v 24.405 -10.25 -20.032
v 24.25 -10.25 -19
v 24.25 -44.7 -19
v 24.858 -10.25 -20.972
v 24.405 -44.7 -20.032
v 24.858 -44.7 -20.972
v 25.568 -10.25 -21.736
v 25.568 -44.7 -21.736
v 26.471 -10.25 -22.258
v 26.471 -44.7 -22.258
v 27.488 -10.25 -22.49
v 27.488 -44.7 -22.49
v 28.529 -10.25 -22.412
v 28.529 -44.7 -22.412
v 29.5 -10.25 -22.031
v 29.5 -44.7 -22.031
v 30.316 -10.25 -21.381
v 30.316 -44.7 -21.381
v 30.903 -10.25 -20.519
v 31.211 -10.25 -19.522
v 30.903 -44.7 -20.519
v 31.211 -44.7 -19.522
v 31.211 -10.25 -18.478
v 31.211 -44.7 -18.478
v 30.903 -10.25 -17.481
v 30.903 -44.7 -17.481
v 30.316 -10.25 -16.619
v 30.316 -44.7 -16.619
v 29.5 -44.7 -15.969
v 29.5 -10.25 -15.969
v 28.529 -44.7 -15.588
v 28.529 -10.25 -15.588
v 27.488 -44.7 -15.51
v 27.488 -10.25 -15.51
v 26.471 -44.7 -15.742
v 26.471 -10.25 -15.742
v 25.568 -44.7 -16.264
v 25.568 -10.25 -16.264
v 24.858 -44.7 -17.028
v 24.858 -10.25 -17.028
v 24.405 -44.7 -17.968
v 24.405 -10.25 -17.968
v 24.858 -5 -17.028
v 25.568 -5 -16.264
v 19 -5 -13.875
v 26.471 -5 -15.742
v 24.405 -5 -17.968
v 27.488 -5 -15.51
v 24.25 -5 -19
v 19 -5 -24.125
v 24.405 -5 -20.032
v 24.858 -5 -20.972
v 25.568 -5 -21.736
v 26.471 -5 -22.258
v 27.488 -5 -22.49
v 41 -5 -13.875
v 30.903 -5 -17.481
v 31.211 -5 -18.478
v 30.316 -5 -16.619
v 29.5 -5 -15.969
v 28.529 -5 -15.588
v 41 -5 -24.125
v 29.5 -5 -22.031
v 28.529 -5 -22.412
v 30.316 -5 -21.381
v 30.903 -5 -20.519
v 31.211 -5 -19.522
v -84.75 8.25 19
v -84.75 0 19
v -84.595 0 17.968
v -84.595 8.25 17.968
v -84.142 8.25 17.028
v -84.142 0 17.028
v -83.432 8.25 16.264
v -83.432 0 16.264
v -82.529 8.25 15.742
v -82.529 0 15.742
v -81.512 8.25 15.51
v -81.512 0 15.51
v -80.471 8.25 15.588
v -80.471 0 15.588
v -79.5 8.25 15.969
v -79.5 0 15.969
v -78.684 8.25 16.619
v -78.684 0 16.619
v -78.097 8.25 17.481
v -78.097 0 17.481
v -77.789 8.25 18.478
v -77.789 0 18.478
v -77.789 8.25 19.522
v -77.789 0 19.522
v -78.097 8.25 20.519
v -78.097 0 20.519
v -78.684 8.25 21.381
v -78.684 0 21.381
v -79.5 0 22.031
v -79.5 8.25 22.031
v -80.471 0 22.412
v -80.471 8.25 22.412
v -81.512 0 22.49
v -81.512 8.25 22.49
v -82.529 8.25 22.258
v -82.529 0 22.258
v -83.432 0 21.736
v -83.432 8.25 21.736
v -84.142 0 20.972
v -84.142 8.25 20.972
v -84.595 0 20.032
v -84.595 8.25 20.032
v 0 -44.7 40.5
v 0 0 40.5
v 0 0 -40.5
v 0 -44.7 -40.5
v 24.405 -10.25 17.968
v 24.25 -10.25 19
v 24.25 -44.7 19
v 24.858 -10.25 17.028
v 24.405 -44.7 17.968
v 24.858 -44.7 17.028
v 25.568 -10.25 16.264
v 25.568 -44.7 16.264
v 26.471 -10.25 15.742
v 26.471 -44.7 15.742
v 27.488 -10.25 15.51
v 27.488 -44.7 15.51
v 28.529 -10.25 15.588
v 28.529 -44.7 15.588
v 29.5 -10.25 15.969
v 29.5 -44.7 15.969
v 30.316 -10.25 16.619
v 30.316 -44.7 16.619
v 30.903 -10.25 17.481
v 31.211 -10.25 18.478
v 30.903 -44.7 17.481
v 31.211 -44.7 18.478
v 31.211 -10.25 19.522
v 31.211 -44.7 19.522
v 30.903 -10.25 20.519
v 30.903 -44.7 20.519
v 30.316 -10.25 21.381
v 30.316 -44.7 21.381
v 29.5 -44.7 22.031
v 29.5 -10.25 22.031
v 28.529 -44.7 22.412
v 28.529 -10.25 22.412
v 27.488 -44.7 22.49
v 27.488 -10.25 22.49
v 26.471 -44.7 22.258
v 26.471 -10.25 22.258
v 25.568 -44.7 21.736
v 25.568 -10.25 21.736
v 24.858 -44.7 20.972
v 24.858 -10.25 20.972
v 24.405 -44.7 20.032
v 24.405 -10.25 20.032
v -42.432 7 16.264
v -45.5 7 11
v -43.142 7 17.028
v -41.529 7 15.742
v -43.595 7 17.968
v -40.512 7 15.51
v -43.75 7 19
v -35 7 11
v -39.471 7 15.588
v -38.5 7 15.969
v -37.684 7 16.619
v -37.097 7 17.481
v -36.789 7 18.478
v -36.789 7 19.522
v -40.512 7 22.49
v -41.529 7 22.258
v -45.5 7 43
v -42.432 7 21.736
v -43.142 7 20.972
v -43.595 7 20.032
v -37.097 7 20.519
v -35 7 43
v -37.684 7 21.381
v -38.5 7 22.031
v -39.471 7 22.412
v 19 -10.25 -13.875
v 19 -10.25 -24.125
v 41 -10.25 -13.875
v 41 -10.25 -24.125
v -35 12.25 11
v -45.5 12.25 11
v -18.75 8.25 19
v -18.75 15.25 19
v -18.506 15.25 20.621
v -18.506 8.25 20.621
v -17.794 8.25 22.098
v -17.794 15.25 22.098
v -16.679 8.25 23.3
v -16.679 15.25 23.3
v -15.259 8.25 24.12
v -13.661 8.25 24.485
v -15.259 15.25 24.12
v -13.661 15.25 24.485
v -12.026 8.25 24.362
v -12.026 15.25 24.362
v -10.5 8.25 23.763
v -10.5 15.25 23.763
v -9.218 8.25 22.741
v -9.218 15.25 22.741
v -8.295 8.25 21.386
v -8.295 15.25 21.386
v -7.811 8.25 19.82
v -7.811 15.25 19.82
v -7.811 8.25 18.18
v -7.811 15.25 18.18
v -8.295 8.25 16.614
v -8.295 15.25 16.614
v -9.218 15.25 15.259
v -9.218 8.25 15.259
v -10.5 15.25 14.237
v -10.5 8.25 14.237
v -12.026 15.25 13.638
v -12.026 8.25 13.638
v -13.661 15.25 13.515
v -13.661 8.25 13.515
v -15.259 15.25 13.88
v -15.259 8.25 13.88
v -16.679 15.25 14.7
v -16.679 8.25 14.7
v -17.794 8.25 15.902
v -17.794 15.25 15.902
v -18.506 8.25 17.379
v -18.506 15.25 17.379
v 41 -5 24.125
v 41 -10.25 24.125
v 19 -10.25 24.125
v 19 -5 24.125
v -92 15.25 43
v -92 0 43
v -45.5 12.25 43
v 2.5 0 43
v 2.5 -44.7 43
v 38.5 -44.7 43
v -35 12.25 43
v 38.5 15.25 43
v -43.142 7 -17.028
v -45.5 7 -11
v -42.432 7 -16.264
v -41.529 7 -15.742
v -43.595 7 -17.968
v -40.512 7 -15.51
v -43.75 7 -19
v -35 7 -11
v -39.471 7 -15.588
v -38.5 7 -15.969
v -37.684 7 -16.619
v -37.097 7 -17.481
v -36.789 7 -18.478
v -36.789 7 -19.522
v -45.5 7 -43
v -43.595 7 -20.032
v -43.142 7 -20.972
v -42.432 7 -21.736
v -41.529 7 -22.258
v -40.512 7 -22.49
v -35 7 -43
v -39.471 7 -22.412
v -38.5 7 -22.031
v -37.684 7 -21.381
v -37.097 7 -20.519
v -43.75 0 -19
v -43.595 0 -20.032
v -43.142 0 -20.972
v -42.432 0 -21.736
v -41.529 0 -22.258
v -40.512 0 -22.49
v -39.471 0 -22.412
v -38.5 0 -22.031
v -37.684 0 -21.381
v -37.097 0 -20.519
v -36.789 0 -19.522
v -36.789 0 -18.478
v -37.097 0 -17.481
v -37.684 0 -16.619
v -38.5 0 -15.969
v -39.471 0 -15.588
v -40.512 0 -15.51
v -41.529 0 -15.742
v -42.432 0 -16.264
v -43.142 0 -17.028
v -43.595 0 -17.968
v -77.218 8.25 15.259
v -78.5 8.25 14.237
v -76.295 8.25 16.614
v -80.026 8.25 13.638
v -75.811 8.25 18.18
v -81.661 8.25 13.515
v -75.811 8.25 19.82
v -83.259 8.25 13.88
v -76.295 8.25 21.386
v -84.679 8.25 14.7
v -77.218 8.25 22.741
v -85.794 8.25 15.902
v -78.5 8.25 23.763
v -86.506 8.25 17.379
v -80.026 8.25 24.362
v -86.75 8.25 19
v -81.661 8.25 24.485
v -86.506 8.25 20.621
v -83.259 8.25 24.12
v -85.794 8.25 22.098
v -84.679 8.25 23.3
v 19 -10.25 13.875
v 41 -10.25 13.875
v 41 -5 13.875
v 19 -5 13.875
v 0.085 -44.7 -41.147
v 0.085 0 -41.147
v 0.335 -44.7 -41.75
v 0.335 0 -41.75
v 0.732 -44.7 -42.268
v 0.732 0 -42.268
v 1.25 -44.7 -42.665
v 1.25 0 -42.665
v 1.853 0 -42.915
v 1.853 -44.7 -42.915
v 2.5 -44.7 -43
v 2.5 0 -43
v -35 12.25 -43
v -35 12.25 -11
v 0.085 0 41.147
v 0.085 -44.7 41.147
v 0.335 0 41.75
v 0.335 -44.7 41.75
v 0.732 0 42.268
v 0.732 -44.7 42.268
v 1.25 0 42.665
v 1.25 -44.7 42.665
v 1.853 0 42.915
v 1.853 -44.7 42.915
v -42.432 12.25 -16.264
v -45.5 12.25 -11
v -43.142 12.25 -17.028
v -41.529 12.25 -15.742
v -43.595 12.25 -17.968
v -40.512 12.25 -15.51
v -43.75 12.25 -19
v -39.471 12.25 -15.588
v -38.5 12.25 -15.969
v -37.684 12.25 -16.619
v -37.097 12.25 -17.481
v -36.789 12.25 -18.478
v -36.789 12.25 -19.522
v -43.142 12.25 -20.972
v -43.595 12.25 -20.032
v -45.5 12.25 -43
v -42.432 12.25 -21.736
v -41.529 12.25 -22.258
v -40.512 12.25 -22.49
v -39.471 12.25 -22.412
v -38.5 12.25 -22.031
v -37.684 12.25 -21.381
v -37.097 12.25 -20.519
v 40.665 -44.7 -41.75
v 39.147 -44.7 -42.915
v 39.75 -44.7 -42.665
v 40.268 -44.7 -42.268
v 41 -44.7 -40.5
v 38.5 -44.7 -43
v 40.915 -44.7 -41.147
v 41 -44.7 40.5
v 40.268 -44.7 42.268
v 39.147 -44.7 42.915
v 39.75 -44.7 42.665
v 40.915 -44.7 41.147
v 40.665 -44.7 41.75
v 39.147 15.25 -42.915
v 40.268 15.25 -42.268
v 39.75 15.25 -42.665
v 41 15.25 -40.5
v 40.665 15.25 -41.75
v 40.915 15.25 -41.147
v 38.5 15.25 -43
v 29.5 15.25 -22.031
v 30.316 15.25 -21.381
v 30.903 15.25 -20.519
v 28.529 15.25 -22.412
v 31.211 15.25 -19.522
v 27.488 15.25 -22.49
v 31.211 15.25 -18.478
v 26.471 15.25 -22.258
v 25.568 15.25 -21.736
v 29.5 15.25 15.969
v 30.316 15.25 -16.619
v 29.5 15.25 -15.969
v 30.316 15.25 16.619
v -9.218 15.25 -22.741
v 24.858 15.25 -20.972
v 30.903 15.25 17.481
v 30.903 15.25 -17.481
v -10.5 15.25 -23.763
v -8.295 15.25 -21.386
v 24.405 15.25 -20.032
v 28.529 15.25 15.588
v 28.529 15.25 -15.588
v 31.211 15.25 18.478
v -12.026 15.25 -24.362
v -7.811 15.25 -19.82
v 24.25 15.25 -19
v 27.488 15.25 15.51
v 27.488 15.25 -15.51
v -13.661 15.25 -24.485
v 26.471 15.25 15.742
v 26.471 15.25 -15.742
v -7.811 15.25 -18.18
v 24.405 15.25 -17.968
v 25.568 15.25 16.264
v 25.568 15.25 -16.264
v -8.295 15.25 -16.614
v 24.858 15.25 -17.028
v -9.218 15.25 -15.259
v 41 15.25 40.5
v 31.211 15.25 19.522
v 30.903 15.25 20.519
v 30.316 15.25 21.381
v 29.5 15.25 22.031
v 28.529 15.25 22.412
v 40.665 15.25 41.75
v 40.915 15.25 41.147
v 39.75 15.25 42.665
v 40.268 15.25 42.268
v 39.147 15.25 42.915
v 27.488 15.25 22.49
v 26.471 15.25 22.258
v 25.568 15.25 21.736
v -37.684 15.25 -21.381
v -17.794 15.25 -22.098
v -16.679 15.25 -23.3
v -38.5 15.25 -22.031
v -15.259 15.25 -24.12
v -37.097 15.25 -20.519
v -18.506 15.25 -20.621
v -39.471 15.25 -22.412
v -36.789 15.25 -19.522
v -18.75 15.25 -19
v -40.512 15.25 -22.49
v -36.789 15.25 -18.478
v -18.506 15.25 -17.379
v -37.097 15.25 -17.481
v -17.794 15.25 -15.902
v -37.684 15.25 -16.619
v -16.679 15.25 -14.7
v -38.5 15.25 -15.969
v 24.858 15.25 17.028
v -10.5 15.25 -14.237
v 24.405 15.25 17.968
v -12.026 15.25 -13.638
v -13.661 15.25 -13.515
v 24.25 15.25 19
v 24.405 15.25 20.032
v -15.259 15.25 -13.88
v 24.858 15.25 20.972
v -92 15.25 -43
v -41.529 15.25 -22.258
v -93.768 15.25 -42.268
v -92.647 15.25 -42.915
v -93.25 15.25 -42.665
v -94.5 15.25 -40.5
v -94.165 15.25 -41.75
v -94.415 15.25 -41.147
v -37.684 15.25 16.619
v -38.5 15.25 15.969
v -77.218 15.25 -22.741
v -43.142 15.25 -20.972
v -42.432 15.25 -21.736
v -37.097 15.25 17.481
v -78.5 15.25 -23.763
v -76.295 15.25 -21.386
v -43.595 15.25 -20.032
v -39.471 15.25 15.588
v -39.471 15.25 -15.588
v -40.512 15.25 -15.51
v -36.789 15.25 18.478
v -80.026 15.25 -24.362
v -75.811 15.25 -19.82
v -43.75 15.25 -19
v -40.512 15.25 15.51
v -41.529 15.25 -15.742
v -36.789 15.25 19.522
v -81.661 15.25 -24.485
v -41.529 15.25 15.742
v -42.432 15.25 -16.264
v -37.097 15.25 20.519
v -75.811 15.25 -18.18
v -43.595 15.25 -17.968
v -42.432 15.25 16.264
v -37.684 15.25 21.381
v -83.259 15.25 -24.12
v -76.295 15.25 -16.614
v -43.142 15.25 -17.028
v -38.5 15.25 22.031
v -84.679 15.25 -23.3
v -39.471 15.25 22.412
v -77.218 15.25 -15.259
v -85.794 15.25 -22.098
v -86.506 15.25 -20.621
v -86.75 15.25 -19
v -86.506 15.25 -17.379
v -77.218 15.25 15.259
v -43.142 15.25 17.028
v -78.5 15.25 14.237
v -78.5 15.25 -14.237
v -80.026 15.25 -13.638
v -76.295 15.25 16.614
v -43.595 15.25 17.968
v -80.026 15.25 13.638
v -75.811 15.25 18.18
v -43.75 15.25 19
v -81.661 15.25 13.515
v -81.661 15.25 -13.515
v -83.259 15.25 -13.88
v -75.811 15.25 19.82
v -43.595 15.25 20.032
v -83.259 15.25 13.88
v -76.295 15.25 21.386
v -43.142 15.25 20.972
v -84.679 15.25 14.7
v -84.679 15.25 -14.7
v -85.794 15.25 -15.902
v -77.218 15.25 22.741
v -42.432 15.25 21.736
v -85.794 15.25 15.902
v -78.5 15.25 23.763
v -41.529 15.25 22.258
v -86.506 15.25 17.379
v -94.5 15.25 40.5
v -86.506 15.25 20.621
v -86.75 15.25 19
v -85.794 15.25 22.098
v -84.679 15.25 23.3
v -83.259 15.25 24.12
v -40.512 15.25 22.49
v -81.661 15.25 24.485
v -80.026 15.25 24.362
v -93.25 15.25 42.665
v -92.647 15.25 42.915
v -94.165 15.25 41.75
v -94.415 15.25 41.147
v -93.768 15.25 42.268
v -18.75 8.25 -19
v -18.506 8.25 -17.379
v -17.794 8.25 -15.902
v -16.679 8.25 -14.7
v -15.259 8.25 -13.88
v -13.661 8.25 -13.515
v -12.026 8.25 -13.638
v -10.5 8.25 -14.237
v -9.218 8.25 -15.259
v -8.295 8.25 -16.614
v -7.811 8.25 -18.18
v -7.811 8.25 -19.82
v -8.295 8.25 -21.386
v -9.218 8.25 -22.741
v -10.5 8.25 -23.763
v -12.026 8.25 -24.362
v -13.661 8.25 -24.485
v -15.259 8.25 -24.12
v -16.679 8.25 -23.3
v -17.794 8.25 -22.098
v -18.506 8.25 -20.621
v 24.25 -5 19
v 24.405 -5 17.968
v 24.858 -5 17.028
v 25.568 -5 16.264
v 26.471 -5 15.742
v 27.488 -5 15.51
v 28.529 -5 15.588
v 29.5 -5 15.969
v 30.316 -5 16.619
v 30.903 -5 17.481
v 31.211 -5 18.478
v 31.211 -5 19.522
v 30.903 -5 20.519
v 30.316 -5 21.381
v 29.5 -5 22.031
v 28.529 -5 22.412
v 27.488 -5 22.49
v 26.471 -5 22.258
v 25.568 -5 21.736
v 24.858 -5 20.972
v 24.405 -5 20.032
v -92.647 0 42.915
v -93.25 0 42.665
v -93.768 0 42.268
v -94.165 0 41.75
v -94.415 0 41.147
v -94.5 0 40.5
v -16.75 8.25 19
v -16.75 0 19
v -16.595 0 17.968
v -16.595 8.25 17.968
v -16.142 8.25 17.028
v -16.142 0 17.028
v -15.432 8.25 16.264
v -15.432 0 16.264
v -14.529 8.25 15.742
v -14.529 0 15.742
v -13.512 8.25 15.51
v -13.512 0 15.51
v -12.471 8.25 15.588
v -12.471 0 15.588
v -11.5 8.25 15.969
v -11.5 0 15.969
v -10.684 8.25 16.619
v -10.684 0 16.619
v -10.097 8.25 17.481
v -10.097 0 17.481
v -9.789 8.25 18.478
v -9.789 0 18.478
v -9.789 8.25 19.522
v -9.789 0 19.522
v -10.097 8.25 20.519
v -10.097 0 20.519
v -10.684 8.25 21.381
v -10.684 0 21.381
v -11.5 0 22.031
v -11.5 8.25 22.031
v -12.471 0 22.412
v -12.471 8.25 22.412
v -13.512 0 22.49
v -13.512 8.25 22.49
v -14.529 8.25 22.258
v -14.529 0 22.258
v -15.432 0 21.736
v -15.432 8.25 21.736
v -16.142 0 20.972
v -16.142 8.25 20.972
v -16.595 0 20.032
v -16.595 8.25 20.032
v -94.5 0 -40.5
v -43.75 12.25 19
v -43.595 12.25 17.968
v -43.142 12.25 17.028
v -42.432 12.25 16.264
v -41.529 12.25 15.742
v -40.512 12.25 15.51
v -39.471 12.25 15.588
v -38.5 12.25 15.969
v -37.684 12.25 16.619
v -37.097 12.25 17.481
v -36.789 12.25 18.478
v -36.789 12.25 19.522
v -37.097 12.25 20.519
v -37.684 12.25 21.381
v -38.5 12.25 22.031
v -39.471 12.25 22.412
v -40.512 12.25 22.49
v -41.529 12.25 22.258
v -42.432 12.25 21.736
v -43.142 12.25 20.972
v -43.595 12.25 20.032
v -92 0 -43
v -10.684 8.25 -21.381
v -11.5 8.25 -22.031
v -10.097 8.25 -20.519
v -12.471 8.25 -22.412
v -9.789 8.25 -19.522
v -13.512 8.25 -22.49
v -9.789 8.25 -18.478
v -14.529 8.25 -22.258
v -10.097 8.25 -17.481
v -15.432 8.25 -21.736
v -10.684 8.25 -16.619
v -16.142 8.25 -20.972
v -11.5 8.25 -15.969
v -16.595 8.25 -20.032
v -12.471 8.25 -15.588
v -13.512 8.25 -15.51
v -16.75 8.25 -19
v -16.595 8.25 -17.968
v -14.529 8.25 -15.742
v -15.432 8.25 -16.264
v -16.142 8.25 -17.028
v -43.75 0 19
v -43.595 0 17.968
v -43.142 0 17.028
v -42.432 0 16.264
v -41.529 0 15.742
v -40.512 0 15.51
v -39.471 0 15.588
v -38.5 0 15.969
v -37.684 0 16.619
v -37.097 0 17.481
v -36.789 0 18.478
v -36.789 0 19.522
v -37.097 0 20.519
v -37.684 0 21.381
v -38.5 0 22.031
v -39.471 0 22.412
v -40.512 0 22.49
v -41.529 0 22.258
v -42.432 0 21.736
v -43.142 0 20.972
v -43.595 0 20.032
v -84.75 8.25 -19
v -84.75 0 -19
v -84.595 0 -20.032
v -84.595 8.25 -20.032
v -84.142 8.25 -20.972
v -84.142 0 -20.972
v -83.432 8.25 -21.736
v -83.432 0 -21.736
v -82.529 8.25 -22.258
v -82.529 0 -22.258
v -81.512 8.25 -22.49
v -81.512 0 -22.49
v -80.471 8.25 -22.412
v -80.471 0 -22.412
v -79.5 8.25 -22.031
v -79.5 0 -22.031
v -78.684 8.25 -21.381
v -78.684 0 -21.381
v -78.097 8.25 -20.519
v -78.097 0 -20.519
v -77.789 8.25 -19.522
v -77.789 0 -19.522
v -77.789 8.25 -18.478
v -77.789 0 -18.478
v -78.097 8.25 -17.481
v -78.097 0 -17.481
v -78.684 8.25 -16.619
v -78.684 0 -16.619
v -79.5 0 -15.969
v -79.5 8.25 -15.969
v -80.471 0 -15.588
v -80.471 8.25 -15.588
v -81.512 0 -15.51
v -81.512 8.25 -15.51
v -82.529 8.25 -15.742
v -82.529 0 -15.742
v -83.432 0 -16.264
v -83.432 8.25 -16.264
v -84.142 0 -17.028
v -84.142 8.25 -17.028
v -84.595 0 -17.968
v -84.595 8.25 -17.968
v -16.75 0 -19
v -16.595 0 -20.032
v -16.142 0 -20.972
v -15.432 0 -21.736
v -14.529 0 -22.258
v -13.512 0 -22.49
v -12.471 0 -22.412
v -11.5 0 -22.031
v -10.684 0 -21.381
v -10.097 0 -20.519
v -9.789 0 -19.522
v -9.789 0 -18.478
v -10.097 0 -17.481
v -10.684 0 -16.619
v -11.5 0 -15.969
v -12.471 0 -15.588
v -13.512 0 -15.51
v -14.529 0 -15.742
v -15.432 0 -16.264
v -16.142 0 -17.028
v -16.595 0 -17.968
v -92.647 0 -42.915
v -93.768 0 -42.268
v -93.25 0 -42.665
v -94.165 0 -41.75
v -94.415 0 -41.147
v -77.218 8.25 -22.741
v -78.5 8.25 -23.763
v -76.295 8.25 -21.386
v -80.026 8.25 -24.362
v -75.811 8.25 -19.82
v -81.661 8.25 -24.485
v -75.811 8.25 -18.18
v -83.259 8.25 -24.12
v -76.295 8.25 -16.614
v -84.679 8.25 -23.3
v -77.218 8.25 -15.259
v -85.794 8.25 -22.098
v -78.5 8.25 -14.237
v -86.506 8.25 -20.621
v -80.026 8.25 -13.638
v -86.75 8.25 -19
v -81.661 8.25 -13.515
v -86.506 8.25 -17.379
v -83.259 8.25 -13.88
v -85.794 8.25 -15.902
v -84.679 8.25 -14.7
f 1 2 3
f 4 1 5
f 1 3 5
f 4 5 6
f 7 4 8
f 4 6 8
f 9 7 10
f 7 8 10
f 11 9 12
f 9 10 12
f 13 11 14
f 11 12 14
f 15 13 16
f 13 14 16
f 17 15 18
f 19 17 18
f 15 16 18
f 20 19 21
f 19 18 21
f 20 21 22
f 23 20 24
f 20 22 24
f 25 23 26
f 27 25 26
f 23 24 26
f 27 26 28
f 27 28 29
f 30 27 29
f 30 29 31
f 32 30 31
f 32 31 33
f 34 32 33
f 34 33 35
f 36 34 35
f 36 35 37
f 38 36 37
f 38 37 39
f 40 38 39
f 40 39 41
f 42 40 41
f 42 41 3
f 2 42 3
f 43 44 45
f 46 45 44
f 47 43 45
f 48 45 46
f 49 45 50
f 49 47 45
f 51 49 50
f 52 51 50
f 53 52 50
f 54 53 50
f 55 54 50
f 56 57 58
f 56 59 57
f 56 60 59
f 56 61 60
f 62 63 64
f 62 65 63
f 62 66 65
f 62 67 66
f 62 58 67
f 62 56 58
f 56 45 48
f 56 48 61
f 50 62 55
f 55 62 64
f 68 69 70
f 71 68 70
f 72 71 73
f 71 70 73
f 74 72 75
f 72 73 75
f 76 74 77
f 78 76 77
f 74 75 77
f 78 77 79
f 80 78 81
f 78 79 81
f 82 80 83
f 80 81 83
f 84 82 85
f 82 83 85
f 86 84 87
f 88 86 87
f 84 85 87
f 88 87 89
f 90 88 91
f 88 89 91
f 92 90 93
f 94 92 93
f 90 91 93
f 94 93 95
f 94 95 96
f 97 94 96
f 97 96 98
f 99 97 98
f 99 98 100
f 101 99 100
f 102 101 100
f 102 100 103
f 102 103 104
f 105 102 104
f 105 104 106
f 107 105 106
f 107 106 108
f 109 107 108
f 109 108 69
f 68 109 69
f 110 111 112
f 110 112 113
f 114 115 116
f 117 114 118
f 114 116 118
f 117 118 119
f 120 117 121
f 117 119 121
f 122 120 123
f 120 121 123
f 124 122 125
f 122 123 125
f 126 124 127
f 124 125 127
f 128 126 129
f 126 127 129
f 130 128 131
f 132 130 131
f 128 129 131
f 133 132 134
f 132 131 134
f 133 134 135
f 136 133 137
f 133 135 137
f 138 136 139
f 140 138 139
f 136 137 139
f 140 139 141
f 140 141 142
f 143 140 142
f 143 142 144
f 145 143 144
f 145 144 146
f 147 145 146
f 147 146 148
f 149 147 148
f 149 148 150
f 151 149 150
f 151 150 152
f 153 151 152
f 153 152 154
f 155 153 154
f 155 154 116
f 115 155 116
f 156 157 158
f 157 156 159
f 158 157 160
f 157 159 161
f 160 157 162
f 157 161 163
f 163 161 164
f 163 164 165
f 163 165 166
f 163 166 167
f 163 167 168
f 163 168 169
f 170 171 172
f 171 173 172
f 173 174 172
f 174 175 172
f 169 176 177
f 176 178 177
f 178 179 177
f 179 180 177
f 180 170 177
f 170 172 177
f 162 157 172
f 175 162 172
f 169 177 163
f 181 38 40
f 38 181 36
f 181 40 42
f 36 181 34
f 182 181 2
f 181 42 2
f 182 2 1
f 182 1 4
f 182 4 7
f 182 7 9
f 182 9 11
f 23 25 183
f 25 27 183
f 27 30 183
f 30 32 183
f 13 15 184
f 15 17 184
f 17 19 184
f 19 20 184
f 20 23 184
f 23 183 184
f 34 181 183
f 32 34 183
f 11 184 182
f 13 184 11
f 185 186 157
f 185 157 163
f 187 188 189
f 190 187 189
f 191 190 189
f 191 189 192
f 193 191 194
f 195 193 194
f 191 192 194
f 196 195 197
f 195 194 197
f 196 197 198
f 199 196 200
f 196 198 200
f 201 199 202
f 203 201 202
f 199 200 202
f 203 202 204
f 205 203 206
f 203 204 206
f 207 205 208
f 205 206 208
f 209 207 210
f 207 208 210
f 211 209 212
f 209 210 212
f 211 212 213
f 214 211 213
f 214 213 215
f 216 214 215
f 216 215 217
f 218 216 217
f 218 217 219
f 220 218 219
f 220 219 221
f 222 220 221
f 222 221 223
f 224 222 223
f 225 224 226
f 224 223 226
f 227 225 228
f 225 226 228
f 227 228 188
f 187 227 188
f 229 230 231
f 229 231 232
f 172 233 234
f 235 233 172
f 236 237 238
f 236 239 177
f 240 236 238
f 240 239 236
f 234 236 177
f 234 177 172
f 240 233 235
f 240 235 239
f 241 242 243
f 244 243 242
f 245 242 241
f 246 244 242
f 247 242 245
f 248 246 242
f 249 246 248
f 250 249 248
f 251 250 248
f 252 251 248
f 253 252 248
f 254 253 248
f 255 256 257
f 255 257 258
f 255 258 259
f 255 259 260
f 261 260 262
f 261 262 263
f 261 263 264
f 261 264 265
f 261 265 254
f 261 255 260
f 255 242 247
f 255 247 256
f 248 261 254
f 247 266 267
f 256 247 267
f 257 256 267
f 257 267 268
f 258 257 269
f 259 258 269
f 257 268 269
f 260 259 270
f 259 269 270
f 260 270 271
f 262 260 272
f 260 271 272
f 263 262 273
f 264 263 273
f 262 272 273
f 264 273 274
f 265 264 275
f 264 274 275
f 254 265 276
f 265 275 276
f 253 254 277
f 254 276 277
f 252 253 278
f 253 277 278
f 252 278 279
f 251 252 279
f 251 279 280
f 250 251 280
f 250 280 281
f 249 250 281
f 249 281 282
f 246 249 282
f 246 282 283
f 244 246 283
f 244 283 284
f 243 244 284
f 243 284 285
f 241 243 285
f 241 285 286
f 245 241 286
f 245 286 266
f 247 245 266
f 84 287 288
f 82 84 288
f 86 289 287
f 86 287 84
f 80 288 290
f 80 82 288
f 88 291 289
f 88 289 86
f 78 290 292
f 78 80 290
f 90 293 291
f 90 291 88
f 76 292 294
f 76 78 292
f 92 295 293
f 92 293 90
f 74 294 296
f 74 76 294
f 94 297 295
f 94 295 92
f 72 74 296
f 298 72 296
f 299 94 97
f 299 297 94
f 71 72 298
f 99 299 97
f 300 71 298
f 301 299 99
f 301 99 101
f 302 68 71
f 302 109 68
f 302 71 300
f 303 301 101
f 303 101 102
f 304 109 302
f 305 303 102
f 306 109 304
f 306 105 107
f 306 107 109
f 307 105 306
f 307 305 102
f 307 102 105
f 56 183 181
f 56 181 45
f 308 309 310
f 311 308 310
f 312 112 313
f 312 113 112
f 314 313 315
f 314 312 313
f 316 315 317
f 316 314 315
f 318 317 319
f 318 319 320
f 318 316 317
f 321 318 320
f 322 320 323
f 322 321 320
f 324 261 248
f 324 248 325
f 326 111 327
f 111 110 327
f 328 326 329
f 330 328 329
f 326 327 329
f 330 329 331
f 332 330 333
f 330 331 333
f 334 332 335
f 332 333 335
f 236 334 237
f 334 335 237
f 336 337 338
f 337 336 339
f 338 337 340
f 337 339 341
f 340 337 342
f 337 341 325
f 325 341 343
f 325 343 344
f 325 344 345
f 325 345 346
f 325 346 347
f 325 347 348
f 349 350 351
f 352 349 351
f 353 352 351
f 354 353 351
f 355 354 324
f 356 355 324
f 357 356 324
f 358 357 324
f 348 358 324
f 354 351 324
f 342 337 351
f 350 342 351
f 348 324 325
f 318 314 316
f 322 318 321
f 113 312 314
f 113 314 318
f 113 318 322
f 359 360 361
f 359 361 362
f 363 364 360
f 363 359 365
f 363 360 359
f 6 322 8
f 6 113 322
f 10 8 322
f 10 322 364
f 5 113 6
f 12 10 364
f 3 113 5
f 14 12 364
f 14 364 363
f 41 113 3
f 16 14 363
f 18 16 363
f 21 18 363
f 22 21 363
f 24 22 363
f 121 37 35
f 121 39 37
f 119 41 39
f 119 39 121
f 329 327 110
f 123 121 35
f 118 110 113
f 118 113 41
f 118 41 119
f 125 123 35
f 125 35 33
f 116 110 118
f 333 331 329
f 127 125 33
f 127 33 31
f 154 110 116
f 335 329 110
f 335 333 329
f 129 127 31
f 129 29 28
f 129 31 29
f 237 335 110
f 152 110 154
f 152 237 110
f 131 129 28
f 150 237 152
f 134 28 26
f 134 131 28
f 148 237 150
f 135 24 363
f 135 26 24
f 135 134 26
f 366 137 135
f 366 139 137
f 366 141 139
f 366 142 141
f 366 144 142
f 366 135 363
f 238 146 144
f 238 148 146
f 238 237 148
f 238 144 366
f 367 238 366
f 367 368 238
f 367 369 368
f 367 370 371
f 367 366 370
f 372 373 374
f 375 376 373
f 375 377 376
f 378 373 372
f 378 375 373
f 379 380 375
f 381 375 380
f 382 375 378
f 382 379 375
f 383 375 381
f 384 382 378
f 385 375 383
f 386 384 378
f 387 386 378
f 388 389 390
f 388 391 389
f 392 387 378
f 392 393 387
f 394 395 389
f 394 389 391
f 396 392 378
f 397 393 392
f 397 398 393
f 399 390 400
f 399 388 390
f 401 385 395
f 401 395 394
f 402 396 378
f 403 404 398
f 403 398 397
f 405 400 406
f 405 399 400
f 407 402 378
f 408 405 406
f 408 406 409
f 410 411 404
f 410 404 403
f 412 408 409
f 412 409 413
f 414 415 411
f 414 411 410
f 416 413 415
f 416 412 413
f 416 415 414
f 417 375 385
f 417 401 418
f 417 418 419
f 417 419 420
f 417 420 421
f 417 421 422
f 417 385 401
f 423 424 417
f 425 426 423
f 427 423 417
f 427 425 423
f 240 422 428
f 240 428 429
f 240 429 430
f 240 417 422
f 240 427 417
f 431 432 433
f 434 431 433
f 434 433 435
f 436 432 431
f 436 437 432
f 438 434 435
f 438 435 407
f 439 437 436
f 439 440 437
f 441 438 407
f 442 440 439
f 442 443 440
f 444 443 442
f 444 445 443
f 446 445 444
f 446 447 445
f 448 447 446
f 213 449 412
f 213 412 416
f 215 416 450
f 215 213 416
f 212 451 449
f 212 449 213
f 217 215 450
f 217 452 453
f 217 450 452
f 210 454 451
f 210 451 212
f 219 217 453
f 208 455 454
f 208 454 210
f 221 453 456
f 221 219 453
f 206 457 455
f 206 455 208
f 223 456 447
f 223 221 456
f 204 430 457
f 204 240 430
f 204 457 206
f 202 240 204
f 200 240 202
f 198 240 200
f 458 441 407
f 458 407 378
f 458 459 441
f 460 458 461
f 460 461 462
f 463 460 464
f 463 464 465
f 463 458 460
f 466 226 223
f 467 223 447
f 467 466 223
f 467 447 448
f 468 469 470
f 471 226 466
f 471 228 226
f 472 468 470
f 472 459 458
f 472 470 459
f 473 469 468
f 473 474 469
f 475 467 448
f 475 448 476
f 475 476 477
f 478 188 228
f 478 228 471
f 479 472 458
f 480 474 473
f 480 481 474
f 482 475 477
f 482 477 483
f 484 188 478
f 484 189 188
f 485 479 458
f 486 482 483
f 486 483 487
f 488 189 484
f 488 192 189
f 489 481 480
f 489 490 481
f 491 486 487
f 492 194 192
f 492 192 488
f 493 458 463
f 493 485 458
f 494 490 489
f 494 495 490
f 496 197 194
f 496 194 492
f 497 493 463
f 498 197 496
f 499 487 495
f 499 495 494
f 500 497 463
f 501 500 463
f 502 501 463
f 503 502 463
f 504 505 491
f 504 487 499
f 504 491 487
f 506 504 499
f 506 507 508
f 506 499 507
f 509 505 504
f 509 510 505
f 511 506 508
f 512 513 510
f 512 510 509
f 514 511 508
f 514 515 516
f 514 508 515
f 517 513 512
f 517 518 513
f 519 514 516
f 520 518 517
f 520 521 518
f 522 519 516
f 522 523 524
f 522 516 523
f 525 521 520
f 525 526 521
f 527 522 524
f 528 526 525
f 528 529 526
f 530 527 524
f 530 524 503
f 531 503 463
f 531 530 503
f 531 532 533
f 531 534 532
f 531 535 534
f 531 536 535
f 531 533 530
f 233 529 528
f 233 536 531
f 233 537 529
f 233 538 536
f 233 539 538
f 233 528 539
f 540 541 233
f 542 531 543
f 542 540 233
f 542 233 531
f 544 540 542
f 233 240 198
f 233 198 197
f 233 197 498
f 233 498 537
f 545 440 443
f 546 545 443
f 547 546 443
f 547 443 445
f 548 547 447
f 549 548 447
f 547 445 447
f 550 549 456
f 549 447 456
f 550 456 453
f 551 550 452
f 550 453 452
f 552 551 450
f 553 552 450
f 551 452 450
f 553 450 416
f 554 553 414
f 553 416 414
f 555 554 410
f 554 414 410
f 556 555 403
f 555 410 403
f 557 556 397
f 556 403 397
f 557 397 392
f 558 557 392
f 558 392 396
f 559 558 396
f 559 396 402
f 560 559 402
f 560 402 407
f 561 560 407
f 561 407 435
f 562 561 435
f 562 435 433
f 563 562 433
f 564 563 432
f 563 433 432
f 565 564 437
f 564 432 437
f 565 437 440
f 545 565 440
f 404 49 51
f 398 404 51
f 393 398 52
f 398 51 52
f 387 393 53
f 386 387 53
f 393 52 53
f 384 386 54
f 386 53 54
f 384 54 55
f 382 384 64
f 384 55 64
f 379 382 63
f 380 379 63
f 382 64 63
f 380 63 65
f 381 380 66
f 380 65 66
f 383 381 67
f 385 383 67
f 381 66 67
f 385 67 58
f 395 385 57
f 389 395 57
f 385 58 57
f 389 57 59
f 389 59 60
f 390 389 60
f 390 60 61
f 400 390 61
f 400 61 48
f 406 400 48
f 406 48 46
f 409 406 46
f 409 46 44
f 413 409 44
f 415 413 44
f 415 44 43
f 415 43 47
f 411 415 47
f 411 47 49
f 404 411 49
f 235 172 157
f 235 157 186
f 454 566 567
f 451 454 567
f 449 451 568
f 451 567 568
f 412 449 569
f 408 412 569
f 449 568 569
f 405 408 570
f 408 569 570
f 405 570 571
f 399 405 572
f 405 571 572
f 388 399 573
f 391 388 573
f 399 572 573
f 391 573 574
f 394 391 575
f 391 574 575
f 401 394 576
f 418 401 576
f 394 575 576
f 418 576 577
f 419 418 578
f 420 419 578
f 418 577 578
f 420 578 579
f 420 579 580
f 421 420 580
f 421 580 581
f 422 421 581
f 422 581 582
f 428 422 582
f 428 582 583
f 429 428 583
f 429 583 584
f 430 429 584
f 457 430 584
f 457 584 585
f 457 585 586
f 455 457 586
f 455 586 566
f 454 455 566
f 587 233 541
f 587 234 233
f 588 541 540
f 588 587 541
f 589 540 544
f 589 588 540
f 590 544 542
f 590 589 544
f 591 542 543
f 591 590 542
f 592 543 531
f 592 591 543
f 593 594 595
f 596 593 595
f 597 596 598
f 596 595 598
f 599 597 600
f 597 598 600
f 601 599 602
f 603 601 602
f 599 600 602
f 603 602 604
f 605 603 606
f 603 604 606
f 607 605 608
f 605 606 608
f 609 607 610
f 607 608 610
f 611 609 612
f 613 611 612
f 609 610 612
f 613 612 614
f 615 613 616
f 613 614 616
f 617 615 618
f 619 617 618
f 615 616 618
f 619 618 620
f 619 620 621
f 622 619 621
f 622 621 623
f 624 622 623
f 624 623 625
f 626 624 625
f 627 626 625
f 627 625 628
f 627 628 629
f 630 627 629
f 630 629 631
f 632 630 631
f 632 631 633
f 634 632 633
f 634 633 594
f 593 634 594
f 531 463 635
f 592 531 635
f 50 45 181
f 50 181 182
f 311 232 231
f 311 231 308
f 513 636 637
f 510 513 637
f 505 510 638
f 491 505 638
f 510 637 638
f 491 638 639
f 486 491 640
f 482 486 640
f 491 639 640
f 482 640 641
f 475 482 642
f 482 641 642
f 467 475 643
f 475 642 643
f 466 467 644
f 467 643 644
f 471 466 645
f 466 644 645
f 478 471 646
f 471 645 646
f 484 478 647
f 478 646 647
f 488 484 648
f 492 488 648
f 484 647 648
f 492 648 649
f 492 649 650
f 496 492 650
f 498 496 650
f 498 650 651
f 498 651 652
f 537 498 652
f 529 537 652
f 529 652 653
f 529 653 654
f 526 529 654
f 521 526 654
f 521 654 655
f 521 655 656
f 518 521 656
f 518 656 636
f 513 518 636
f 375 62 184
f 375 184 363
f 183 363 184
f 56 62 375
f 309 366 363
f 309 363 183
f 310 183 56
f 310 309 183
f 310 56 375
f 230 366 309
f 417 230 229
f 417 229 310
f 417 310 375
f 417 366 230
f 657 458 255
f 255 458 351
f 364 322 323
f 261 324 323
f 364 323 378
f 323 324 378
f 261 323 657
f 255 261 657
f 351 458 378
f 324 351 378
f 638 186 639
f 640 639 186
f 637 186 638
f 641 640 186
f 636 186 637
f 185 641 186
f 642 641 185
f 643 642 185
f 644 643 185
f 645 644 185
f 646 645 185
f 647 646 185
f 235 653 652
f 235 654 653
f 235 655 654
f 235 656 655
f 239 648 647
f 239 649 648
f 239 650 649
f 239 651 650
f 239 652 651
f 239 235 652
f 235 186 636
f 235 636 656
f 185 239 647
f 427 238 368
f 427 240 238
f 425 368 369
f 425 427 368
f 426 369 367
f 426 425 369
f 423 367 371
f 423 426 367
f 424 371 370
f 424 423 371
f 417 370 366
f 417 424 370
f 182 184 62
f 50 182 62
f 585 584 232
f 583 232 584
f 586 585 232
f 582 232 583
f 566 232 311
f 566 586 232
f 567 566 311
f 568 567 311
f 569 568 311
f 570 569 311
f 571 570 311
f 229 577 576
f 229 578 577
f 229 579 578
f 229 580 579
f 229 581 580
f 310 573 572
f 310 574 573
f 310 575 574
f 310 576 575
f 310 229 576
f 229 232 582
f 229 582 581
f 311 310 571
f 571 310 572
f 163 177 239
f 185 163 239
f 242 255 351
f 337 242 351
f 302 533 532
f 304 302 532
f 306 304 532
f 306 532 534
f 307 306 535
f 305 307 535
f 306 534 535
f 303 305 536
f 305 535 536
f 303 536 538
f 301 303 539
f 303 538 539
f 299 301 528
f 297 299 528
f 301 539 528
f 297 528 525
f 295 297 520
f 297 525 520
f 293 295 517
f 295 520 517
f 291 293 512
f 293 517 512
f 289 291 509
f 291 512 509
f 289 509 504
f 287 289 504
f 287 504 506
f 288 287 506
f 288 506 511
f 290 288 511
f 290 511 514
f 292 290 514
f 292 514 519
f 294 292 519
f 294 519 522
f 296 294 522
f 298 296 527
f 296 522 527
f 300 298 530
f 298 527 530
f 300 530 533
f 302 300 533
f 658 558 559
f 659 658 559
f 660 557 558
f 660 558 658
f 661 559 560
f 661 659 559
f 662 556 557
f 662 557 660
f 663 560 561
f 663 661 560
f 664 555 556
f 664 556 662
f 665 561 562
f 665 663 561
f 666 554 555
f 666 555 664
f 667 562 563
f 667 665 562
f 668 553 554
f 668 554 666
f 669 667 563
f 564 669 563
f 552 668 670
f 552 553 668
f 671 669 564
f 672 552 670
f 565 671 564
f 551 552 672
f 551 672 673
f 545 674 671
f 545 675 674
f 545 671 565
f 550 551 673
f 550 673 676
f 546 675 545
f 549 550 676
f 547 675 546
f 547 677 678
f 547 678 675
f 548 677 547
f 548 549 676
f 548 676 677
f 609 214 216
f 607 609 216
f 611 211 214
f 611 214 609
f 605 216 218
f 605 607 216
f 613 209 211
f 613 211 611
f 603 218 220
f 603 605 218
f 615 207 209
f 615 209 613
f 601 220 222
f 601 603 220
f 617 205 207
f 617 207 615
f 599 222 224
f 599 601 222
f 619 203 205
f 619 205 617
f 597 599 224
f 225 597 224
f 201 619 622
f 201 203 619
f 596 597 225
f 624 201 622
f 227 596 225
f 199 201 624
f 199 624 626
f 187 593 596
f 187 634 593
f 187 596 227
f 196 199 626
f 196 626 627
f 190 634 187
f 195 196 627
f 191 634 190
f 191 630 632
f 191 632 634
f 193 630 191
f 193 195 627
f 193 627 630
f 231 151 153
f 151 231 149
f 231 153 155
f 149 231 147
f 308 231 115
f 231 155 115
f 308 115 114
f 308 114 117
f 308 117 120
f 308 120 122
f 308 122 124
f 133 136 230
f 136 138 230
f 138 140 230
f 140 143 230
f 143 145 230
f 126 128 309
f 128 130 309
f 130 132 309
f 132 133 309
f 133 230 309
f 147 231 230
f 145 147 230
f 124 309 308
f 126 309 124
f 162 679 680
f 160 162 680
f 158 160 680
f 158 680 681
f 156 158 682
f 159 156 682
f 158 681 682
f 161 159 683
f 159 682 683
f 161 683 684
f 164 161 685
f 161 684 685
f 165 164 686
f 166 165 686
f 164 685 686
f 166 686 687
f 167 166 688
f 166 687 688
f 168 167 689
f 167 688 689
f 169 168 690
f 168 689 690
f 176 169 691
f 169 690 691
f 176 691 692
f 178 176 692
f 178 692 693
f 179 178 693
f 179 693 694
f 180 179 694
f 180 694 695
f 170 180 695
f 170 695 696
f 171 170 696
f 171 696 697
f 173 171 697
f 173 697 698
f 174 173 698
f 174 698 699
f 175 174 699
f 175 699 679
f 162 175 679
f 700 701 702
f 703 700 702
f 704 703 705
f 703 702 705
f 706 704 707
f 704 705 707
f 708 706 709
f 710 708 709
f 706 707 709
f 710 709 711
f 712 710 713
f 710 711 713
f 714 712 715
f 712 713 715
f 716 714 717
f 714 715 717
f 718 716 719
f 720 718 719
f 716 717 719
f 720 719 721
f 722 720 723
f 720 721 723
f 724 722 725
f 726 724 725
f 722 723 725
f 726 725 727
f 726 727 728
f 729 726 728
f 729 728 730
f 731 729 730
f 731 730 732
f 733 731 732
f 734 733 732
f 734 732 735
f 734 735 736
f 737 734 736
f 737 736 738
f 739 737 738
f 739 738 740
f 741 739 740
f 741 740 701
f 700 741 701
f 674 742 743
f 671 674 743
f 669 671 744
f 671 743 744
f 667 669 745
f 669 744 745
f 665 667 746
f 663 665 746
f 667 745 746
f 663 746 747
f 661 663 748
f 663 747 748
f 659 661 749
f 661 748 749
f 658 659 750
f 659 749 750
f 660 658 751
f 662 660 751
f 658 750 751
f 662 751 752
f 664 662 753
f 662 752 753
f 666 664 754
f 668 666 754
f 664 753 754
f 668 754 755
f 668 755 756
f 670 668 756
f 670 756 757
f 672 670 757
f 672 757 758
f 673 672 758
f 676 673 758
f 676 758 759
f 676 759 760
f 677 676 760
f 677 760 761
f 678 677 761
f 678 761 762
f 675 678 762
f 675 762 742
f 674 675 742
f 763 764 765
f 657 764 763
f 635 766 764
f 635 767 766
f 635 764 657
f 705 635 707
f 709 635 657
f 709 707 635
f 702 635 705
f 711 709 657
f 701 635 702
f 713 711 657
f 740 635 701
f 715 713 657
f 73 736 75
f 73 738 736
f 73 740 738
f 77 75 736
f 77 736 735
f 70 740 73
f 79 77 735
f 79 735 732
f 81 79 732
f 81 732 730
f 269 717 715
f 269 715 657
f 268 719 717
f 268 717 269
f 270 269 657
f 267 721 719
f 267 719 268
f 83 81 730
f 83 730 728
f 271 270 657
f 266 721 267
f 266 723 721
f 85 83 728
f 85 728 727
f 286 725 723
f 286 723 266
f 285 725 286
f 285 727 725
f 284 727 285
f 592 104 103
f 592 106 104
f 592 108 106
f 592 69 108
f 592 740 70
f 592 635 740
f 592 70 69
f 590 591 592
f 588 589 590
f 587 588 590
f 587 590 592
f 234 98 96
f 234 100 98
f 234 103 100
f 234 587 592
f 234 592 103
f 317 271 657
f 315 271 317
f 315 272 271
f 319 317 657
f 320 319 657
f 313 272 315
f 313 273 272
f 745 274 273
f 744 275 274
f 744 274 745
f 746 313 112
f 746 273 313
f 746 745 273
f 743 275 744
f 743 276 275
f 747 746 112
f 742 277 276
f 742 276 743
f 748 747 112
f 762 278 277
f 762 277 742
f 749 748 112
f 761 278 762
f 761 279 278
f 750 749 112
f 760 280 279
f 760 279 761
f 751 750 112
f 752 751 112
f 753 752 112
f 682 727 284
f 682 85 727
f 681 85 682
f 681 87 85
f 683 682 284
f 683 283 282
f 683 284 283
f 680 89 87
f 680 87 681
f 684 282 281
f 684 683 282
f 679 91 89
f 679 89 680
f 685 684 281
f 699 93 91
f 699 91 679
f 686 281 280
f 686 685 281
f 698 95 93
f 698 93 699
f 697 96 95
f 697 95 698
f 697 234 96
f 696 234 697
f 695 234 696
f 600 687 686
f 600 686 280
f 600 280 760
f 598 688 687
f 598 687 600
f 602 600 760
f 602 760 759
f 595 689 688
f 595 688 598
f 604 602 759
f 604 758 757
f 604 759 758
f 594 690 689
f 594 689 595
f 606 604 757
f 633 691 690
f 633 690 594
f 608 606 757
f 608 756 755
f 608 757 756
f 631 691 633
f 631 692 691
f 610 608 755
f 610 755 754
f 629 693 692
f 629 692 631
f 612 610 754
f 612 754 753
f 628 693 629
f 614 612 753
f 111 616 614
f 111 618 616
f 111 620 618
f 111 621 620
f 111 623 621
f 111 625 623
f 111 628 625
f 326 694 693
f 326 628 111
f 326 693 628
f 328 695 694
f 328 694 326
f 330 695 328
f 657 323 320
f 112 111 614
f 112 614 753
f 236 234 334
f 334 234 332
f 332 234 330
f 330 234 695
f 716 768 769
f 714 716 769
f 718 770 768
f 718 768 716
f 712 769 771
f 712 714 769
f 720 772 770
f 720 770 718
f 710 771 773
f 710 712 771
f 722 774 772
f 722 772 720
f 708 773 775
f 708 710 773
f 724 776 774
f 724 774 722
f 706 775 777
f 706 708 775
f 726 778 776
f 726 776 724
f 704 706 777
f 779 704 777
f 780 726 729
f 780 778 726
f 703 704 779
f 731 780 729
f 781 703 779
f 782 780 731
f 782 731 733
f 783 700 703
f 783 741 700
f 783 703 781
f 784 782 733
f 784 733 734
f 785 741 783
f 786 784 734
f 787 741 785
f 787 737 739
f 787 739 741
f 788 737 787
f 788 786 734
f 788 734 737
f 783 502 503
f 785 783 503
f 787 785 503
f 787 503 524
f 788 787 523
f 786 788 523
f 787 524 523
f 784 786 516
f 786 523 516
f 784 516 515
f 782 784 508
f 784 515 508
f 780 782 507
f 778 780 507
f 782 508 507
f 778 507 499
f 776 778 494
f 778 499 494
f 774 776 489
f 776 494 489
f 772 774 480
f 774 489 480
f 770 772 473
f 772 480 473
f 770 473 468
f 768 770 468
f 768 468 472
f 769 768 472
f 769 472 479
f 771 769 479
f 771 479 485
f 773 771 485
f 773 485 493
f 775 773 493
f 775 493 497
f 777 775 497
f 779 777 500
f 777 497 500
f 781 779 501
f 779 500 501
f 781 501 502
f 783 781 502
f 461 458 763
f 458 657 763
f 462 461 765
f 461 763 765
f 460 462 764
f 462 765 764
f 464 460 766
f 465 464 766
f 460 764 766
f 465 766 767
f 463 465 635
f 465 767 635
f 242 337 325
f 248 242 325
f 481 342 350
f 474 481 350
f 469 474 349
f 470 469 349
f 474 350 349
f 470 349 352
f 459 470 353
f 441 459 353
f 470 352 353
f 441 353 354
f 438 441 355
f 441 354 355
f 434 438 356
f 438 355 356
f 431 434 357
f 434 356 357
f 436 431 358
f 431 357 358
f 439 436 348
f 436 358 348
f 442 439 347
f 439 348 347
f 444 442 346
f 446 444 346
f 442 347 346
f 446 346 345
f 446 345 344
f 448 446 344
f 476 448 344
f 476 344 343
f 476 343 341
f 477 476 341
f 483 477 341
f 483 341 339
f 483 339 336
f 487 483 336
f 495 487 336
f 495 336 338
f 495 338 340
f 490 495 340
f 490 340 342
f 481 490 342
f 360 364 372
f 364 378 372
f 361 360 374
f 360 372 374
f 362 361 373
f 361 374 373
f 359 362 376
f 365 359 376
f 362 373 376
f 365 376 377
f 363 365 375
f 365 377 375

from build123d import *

# Parameters (mm, degrees)
BOSS_EXTRUDE1_DEPTH  = 43
M6_CLEARANCE_HOLE1_D = 7
SKETCH4_R            = 5.5
CUT_EXTRUDE1_DEPTH   = 7
SKETCH5_W            = 10.25
SKETCH5_H            = 5.25
CUT_EXTRUDE2_DEPTH   = 22
SKETCH6_W            = 10.5
SKETCH6_H            = 5.25
CUT_EXTRUDE3_DEPTH   = 32
FILLET1_R            = 2.5


with BuildPart() as part:
    # Sketch1 → Boss-Extrude1 (new, symmetric)
    with BuildSketch(Plane.XY):
        Polygon((0, 0), (0, -44.7), (41, -44.7), (41, 15.25), (-94.5, 15.25), (-94.5, 0), align=None)
    extrude(amount=BOSS_EXTRUDE1_DEPTH, both=True)

    # M6 Clearance Hole1 (through all)
    with Locations(Plane(origin=(0, 15.25, 0), x_dir=(1, 0, 0), z_dir=(0, 1, 0))):
        with Locations((-81.25, 19), (-81.25, -19), (-13.25, -19), (-13.25, 19), (27.75, 19), (27.75, -19), (-40.25, 19), (-40.25, -19)):
            Hole(M6_CLEARANCE_HOLE1_D / 2)

    # Sketch4 → Cut-Extrude1 (cut)
    with BuildSketch(Plane(origin=(0, 15.25, 0), x_dir=(1, 0, 0), z_dir=(0, 1, 0))):
        with Locations(Location((-81.25, 19, 0), (0, 0, 180))):
            Circle(SKETCH4_R)
        with Locations(Location((-81.25, -19, 0), (0, 0, 180))):
            Circle(SKETCH4_R)
        with Locations(Location((-13.25, 19, 0), (0, 0, 180))):
            Circle(SKETCH4_R)
        with Locations(Location((-13.25, -19, 0), (0, 0, 180))):
            Circle(SKETCH4_R)
    extrude(amount=-CUT_EXTRUDE1_DEPTH, mode=Mode.SUBTRACT)

    # Sketch5 → Cut-Extrude2 (cut)
    with BuildSketch(Plane(origin=(41, 0, 0), x_dir=(0, 0, -1), z_dir=(1, 0, 0))):
        with Locations((-19, -7.625)):
            Rectangle(SKETCH5_W, SKETCH5_H)
        with Locations((19, -7.625)):
            Rectangle(SKETCH5_W, SKETCH5_H)
    extrude(amount=-CUT_EXTRUDE2_DEPTH, mode=Mode.SUBTRACT)

    # Sketch6 → Cut-Extrude3 (cut)
    with BuildSketch(Plane.XY.offset(43)):
        with Locations((-40.25, 9.625)):
            Rectangle(SKETCH6_W, SKETCH6_H)
    cut_extrude3 = extrude(amount=-CUT_EXTRUDE3_DEPTH, mode=Mode.SUBTRACT)

    # Mirror1: Cut-Extrude3 across plane
    add(cut_extrude3.mirror(Plane.XY), mode=Mode.SUBTRACT)

    # Fillet1
    fillet1_edges = [part.edges().sort_by_distance(p)[0] for p in [
        (41, -14.725, 43),
        (-94.5, 7.625, 43),
        (-94.5, 7.625, -43),
        (41, -14.725, -43),
        (0, -22.35, -43),
        (0, -22.35, 43),
    ]]
    fillet(fillet1_edges, radius=FILLET1_R)


solid = part.part
